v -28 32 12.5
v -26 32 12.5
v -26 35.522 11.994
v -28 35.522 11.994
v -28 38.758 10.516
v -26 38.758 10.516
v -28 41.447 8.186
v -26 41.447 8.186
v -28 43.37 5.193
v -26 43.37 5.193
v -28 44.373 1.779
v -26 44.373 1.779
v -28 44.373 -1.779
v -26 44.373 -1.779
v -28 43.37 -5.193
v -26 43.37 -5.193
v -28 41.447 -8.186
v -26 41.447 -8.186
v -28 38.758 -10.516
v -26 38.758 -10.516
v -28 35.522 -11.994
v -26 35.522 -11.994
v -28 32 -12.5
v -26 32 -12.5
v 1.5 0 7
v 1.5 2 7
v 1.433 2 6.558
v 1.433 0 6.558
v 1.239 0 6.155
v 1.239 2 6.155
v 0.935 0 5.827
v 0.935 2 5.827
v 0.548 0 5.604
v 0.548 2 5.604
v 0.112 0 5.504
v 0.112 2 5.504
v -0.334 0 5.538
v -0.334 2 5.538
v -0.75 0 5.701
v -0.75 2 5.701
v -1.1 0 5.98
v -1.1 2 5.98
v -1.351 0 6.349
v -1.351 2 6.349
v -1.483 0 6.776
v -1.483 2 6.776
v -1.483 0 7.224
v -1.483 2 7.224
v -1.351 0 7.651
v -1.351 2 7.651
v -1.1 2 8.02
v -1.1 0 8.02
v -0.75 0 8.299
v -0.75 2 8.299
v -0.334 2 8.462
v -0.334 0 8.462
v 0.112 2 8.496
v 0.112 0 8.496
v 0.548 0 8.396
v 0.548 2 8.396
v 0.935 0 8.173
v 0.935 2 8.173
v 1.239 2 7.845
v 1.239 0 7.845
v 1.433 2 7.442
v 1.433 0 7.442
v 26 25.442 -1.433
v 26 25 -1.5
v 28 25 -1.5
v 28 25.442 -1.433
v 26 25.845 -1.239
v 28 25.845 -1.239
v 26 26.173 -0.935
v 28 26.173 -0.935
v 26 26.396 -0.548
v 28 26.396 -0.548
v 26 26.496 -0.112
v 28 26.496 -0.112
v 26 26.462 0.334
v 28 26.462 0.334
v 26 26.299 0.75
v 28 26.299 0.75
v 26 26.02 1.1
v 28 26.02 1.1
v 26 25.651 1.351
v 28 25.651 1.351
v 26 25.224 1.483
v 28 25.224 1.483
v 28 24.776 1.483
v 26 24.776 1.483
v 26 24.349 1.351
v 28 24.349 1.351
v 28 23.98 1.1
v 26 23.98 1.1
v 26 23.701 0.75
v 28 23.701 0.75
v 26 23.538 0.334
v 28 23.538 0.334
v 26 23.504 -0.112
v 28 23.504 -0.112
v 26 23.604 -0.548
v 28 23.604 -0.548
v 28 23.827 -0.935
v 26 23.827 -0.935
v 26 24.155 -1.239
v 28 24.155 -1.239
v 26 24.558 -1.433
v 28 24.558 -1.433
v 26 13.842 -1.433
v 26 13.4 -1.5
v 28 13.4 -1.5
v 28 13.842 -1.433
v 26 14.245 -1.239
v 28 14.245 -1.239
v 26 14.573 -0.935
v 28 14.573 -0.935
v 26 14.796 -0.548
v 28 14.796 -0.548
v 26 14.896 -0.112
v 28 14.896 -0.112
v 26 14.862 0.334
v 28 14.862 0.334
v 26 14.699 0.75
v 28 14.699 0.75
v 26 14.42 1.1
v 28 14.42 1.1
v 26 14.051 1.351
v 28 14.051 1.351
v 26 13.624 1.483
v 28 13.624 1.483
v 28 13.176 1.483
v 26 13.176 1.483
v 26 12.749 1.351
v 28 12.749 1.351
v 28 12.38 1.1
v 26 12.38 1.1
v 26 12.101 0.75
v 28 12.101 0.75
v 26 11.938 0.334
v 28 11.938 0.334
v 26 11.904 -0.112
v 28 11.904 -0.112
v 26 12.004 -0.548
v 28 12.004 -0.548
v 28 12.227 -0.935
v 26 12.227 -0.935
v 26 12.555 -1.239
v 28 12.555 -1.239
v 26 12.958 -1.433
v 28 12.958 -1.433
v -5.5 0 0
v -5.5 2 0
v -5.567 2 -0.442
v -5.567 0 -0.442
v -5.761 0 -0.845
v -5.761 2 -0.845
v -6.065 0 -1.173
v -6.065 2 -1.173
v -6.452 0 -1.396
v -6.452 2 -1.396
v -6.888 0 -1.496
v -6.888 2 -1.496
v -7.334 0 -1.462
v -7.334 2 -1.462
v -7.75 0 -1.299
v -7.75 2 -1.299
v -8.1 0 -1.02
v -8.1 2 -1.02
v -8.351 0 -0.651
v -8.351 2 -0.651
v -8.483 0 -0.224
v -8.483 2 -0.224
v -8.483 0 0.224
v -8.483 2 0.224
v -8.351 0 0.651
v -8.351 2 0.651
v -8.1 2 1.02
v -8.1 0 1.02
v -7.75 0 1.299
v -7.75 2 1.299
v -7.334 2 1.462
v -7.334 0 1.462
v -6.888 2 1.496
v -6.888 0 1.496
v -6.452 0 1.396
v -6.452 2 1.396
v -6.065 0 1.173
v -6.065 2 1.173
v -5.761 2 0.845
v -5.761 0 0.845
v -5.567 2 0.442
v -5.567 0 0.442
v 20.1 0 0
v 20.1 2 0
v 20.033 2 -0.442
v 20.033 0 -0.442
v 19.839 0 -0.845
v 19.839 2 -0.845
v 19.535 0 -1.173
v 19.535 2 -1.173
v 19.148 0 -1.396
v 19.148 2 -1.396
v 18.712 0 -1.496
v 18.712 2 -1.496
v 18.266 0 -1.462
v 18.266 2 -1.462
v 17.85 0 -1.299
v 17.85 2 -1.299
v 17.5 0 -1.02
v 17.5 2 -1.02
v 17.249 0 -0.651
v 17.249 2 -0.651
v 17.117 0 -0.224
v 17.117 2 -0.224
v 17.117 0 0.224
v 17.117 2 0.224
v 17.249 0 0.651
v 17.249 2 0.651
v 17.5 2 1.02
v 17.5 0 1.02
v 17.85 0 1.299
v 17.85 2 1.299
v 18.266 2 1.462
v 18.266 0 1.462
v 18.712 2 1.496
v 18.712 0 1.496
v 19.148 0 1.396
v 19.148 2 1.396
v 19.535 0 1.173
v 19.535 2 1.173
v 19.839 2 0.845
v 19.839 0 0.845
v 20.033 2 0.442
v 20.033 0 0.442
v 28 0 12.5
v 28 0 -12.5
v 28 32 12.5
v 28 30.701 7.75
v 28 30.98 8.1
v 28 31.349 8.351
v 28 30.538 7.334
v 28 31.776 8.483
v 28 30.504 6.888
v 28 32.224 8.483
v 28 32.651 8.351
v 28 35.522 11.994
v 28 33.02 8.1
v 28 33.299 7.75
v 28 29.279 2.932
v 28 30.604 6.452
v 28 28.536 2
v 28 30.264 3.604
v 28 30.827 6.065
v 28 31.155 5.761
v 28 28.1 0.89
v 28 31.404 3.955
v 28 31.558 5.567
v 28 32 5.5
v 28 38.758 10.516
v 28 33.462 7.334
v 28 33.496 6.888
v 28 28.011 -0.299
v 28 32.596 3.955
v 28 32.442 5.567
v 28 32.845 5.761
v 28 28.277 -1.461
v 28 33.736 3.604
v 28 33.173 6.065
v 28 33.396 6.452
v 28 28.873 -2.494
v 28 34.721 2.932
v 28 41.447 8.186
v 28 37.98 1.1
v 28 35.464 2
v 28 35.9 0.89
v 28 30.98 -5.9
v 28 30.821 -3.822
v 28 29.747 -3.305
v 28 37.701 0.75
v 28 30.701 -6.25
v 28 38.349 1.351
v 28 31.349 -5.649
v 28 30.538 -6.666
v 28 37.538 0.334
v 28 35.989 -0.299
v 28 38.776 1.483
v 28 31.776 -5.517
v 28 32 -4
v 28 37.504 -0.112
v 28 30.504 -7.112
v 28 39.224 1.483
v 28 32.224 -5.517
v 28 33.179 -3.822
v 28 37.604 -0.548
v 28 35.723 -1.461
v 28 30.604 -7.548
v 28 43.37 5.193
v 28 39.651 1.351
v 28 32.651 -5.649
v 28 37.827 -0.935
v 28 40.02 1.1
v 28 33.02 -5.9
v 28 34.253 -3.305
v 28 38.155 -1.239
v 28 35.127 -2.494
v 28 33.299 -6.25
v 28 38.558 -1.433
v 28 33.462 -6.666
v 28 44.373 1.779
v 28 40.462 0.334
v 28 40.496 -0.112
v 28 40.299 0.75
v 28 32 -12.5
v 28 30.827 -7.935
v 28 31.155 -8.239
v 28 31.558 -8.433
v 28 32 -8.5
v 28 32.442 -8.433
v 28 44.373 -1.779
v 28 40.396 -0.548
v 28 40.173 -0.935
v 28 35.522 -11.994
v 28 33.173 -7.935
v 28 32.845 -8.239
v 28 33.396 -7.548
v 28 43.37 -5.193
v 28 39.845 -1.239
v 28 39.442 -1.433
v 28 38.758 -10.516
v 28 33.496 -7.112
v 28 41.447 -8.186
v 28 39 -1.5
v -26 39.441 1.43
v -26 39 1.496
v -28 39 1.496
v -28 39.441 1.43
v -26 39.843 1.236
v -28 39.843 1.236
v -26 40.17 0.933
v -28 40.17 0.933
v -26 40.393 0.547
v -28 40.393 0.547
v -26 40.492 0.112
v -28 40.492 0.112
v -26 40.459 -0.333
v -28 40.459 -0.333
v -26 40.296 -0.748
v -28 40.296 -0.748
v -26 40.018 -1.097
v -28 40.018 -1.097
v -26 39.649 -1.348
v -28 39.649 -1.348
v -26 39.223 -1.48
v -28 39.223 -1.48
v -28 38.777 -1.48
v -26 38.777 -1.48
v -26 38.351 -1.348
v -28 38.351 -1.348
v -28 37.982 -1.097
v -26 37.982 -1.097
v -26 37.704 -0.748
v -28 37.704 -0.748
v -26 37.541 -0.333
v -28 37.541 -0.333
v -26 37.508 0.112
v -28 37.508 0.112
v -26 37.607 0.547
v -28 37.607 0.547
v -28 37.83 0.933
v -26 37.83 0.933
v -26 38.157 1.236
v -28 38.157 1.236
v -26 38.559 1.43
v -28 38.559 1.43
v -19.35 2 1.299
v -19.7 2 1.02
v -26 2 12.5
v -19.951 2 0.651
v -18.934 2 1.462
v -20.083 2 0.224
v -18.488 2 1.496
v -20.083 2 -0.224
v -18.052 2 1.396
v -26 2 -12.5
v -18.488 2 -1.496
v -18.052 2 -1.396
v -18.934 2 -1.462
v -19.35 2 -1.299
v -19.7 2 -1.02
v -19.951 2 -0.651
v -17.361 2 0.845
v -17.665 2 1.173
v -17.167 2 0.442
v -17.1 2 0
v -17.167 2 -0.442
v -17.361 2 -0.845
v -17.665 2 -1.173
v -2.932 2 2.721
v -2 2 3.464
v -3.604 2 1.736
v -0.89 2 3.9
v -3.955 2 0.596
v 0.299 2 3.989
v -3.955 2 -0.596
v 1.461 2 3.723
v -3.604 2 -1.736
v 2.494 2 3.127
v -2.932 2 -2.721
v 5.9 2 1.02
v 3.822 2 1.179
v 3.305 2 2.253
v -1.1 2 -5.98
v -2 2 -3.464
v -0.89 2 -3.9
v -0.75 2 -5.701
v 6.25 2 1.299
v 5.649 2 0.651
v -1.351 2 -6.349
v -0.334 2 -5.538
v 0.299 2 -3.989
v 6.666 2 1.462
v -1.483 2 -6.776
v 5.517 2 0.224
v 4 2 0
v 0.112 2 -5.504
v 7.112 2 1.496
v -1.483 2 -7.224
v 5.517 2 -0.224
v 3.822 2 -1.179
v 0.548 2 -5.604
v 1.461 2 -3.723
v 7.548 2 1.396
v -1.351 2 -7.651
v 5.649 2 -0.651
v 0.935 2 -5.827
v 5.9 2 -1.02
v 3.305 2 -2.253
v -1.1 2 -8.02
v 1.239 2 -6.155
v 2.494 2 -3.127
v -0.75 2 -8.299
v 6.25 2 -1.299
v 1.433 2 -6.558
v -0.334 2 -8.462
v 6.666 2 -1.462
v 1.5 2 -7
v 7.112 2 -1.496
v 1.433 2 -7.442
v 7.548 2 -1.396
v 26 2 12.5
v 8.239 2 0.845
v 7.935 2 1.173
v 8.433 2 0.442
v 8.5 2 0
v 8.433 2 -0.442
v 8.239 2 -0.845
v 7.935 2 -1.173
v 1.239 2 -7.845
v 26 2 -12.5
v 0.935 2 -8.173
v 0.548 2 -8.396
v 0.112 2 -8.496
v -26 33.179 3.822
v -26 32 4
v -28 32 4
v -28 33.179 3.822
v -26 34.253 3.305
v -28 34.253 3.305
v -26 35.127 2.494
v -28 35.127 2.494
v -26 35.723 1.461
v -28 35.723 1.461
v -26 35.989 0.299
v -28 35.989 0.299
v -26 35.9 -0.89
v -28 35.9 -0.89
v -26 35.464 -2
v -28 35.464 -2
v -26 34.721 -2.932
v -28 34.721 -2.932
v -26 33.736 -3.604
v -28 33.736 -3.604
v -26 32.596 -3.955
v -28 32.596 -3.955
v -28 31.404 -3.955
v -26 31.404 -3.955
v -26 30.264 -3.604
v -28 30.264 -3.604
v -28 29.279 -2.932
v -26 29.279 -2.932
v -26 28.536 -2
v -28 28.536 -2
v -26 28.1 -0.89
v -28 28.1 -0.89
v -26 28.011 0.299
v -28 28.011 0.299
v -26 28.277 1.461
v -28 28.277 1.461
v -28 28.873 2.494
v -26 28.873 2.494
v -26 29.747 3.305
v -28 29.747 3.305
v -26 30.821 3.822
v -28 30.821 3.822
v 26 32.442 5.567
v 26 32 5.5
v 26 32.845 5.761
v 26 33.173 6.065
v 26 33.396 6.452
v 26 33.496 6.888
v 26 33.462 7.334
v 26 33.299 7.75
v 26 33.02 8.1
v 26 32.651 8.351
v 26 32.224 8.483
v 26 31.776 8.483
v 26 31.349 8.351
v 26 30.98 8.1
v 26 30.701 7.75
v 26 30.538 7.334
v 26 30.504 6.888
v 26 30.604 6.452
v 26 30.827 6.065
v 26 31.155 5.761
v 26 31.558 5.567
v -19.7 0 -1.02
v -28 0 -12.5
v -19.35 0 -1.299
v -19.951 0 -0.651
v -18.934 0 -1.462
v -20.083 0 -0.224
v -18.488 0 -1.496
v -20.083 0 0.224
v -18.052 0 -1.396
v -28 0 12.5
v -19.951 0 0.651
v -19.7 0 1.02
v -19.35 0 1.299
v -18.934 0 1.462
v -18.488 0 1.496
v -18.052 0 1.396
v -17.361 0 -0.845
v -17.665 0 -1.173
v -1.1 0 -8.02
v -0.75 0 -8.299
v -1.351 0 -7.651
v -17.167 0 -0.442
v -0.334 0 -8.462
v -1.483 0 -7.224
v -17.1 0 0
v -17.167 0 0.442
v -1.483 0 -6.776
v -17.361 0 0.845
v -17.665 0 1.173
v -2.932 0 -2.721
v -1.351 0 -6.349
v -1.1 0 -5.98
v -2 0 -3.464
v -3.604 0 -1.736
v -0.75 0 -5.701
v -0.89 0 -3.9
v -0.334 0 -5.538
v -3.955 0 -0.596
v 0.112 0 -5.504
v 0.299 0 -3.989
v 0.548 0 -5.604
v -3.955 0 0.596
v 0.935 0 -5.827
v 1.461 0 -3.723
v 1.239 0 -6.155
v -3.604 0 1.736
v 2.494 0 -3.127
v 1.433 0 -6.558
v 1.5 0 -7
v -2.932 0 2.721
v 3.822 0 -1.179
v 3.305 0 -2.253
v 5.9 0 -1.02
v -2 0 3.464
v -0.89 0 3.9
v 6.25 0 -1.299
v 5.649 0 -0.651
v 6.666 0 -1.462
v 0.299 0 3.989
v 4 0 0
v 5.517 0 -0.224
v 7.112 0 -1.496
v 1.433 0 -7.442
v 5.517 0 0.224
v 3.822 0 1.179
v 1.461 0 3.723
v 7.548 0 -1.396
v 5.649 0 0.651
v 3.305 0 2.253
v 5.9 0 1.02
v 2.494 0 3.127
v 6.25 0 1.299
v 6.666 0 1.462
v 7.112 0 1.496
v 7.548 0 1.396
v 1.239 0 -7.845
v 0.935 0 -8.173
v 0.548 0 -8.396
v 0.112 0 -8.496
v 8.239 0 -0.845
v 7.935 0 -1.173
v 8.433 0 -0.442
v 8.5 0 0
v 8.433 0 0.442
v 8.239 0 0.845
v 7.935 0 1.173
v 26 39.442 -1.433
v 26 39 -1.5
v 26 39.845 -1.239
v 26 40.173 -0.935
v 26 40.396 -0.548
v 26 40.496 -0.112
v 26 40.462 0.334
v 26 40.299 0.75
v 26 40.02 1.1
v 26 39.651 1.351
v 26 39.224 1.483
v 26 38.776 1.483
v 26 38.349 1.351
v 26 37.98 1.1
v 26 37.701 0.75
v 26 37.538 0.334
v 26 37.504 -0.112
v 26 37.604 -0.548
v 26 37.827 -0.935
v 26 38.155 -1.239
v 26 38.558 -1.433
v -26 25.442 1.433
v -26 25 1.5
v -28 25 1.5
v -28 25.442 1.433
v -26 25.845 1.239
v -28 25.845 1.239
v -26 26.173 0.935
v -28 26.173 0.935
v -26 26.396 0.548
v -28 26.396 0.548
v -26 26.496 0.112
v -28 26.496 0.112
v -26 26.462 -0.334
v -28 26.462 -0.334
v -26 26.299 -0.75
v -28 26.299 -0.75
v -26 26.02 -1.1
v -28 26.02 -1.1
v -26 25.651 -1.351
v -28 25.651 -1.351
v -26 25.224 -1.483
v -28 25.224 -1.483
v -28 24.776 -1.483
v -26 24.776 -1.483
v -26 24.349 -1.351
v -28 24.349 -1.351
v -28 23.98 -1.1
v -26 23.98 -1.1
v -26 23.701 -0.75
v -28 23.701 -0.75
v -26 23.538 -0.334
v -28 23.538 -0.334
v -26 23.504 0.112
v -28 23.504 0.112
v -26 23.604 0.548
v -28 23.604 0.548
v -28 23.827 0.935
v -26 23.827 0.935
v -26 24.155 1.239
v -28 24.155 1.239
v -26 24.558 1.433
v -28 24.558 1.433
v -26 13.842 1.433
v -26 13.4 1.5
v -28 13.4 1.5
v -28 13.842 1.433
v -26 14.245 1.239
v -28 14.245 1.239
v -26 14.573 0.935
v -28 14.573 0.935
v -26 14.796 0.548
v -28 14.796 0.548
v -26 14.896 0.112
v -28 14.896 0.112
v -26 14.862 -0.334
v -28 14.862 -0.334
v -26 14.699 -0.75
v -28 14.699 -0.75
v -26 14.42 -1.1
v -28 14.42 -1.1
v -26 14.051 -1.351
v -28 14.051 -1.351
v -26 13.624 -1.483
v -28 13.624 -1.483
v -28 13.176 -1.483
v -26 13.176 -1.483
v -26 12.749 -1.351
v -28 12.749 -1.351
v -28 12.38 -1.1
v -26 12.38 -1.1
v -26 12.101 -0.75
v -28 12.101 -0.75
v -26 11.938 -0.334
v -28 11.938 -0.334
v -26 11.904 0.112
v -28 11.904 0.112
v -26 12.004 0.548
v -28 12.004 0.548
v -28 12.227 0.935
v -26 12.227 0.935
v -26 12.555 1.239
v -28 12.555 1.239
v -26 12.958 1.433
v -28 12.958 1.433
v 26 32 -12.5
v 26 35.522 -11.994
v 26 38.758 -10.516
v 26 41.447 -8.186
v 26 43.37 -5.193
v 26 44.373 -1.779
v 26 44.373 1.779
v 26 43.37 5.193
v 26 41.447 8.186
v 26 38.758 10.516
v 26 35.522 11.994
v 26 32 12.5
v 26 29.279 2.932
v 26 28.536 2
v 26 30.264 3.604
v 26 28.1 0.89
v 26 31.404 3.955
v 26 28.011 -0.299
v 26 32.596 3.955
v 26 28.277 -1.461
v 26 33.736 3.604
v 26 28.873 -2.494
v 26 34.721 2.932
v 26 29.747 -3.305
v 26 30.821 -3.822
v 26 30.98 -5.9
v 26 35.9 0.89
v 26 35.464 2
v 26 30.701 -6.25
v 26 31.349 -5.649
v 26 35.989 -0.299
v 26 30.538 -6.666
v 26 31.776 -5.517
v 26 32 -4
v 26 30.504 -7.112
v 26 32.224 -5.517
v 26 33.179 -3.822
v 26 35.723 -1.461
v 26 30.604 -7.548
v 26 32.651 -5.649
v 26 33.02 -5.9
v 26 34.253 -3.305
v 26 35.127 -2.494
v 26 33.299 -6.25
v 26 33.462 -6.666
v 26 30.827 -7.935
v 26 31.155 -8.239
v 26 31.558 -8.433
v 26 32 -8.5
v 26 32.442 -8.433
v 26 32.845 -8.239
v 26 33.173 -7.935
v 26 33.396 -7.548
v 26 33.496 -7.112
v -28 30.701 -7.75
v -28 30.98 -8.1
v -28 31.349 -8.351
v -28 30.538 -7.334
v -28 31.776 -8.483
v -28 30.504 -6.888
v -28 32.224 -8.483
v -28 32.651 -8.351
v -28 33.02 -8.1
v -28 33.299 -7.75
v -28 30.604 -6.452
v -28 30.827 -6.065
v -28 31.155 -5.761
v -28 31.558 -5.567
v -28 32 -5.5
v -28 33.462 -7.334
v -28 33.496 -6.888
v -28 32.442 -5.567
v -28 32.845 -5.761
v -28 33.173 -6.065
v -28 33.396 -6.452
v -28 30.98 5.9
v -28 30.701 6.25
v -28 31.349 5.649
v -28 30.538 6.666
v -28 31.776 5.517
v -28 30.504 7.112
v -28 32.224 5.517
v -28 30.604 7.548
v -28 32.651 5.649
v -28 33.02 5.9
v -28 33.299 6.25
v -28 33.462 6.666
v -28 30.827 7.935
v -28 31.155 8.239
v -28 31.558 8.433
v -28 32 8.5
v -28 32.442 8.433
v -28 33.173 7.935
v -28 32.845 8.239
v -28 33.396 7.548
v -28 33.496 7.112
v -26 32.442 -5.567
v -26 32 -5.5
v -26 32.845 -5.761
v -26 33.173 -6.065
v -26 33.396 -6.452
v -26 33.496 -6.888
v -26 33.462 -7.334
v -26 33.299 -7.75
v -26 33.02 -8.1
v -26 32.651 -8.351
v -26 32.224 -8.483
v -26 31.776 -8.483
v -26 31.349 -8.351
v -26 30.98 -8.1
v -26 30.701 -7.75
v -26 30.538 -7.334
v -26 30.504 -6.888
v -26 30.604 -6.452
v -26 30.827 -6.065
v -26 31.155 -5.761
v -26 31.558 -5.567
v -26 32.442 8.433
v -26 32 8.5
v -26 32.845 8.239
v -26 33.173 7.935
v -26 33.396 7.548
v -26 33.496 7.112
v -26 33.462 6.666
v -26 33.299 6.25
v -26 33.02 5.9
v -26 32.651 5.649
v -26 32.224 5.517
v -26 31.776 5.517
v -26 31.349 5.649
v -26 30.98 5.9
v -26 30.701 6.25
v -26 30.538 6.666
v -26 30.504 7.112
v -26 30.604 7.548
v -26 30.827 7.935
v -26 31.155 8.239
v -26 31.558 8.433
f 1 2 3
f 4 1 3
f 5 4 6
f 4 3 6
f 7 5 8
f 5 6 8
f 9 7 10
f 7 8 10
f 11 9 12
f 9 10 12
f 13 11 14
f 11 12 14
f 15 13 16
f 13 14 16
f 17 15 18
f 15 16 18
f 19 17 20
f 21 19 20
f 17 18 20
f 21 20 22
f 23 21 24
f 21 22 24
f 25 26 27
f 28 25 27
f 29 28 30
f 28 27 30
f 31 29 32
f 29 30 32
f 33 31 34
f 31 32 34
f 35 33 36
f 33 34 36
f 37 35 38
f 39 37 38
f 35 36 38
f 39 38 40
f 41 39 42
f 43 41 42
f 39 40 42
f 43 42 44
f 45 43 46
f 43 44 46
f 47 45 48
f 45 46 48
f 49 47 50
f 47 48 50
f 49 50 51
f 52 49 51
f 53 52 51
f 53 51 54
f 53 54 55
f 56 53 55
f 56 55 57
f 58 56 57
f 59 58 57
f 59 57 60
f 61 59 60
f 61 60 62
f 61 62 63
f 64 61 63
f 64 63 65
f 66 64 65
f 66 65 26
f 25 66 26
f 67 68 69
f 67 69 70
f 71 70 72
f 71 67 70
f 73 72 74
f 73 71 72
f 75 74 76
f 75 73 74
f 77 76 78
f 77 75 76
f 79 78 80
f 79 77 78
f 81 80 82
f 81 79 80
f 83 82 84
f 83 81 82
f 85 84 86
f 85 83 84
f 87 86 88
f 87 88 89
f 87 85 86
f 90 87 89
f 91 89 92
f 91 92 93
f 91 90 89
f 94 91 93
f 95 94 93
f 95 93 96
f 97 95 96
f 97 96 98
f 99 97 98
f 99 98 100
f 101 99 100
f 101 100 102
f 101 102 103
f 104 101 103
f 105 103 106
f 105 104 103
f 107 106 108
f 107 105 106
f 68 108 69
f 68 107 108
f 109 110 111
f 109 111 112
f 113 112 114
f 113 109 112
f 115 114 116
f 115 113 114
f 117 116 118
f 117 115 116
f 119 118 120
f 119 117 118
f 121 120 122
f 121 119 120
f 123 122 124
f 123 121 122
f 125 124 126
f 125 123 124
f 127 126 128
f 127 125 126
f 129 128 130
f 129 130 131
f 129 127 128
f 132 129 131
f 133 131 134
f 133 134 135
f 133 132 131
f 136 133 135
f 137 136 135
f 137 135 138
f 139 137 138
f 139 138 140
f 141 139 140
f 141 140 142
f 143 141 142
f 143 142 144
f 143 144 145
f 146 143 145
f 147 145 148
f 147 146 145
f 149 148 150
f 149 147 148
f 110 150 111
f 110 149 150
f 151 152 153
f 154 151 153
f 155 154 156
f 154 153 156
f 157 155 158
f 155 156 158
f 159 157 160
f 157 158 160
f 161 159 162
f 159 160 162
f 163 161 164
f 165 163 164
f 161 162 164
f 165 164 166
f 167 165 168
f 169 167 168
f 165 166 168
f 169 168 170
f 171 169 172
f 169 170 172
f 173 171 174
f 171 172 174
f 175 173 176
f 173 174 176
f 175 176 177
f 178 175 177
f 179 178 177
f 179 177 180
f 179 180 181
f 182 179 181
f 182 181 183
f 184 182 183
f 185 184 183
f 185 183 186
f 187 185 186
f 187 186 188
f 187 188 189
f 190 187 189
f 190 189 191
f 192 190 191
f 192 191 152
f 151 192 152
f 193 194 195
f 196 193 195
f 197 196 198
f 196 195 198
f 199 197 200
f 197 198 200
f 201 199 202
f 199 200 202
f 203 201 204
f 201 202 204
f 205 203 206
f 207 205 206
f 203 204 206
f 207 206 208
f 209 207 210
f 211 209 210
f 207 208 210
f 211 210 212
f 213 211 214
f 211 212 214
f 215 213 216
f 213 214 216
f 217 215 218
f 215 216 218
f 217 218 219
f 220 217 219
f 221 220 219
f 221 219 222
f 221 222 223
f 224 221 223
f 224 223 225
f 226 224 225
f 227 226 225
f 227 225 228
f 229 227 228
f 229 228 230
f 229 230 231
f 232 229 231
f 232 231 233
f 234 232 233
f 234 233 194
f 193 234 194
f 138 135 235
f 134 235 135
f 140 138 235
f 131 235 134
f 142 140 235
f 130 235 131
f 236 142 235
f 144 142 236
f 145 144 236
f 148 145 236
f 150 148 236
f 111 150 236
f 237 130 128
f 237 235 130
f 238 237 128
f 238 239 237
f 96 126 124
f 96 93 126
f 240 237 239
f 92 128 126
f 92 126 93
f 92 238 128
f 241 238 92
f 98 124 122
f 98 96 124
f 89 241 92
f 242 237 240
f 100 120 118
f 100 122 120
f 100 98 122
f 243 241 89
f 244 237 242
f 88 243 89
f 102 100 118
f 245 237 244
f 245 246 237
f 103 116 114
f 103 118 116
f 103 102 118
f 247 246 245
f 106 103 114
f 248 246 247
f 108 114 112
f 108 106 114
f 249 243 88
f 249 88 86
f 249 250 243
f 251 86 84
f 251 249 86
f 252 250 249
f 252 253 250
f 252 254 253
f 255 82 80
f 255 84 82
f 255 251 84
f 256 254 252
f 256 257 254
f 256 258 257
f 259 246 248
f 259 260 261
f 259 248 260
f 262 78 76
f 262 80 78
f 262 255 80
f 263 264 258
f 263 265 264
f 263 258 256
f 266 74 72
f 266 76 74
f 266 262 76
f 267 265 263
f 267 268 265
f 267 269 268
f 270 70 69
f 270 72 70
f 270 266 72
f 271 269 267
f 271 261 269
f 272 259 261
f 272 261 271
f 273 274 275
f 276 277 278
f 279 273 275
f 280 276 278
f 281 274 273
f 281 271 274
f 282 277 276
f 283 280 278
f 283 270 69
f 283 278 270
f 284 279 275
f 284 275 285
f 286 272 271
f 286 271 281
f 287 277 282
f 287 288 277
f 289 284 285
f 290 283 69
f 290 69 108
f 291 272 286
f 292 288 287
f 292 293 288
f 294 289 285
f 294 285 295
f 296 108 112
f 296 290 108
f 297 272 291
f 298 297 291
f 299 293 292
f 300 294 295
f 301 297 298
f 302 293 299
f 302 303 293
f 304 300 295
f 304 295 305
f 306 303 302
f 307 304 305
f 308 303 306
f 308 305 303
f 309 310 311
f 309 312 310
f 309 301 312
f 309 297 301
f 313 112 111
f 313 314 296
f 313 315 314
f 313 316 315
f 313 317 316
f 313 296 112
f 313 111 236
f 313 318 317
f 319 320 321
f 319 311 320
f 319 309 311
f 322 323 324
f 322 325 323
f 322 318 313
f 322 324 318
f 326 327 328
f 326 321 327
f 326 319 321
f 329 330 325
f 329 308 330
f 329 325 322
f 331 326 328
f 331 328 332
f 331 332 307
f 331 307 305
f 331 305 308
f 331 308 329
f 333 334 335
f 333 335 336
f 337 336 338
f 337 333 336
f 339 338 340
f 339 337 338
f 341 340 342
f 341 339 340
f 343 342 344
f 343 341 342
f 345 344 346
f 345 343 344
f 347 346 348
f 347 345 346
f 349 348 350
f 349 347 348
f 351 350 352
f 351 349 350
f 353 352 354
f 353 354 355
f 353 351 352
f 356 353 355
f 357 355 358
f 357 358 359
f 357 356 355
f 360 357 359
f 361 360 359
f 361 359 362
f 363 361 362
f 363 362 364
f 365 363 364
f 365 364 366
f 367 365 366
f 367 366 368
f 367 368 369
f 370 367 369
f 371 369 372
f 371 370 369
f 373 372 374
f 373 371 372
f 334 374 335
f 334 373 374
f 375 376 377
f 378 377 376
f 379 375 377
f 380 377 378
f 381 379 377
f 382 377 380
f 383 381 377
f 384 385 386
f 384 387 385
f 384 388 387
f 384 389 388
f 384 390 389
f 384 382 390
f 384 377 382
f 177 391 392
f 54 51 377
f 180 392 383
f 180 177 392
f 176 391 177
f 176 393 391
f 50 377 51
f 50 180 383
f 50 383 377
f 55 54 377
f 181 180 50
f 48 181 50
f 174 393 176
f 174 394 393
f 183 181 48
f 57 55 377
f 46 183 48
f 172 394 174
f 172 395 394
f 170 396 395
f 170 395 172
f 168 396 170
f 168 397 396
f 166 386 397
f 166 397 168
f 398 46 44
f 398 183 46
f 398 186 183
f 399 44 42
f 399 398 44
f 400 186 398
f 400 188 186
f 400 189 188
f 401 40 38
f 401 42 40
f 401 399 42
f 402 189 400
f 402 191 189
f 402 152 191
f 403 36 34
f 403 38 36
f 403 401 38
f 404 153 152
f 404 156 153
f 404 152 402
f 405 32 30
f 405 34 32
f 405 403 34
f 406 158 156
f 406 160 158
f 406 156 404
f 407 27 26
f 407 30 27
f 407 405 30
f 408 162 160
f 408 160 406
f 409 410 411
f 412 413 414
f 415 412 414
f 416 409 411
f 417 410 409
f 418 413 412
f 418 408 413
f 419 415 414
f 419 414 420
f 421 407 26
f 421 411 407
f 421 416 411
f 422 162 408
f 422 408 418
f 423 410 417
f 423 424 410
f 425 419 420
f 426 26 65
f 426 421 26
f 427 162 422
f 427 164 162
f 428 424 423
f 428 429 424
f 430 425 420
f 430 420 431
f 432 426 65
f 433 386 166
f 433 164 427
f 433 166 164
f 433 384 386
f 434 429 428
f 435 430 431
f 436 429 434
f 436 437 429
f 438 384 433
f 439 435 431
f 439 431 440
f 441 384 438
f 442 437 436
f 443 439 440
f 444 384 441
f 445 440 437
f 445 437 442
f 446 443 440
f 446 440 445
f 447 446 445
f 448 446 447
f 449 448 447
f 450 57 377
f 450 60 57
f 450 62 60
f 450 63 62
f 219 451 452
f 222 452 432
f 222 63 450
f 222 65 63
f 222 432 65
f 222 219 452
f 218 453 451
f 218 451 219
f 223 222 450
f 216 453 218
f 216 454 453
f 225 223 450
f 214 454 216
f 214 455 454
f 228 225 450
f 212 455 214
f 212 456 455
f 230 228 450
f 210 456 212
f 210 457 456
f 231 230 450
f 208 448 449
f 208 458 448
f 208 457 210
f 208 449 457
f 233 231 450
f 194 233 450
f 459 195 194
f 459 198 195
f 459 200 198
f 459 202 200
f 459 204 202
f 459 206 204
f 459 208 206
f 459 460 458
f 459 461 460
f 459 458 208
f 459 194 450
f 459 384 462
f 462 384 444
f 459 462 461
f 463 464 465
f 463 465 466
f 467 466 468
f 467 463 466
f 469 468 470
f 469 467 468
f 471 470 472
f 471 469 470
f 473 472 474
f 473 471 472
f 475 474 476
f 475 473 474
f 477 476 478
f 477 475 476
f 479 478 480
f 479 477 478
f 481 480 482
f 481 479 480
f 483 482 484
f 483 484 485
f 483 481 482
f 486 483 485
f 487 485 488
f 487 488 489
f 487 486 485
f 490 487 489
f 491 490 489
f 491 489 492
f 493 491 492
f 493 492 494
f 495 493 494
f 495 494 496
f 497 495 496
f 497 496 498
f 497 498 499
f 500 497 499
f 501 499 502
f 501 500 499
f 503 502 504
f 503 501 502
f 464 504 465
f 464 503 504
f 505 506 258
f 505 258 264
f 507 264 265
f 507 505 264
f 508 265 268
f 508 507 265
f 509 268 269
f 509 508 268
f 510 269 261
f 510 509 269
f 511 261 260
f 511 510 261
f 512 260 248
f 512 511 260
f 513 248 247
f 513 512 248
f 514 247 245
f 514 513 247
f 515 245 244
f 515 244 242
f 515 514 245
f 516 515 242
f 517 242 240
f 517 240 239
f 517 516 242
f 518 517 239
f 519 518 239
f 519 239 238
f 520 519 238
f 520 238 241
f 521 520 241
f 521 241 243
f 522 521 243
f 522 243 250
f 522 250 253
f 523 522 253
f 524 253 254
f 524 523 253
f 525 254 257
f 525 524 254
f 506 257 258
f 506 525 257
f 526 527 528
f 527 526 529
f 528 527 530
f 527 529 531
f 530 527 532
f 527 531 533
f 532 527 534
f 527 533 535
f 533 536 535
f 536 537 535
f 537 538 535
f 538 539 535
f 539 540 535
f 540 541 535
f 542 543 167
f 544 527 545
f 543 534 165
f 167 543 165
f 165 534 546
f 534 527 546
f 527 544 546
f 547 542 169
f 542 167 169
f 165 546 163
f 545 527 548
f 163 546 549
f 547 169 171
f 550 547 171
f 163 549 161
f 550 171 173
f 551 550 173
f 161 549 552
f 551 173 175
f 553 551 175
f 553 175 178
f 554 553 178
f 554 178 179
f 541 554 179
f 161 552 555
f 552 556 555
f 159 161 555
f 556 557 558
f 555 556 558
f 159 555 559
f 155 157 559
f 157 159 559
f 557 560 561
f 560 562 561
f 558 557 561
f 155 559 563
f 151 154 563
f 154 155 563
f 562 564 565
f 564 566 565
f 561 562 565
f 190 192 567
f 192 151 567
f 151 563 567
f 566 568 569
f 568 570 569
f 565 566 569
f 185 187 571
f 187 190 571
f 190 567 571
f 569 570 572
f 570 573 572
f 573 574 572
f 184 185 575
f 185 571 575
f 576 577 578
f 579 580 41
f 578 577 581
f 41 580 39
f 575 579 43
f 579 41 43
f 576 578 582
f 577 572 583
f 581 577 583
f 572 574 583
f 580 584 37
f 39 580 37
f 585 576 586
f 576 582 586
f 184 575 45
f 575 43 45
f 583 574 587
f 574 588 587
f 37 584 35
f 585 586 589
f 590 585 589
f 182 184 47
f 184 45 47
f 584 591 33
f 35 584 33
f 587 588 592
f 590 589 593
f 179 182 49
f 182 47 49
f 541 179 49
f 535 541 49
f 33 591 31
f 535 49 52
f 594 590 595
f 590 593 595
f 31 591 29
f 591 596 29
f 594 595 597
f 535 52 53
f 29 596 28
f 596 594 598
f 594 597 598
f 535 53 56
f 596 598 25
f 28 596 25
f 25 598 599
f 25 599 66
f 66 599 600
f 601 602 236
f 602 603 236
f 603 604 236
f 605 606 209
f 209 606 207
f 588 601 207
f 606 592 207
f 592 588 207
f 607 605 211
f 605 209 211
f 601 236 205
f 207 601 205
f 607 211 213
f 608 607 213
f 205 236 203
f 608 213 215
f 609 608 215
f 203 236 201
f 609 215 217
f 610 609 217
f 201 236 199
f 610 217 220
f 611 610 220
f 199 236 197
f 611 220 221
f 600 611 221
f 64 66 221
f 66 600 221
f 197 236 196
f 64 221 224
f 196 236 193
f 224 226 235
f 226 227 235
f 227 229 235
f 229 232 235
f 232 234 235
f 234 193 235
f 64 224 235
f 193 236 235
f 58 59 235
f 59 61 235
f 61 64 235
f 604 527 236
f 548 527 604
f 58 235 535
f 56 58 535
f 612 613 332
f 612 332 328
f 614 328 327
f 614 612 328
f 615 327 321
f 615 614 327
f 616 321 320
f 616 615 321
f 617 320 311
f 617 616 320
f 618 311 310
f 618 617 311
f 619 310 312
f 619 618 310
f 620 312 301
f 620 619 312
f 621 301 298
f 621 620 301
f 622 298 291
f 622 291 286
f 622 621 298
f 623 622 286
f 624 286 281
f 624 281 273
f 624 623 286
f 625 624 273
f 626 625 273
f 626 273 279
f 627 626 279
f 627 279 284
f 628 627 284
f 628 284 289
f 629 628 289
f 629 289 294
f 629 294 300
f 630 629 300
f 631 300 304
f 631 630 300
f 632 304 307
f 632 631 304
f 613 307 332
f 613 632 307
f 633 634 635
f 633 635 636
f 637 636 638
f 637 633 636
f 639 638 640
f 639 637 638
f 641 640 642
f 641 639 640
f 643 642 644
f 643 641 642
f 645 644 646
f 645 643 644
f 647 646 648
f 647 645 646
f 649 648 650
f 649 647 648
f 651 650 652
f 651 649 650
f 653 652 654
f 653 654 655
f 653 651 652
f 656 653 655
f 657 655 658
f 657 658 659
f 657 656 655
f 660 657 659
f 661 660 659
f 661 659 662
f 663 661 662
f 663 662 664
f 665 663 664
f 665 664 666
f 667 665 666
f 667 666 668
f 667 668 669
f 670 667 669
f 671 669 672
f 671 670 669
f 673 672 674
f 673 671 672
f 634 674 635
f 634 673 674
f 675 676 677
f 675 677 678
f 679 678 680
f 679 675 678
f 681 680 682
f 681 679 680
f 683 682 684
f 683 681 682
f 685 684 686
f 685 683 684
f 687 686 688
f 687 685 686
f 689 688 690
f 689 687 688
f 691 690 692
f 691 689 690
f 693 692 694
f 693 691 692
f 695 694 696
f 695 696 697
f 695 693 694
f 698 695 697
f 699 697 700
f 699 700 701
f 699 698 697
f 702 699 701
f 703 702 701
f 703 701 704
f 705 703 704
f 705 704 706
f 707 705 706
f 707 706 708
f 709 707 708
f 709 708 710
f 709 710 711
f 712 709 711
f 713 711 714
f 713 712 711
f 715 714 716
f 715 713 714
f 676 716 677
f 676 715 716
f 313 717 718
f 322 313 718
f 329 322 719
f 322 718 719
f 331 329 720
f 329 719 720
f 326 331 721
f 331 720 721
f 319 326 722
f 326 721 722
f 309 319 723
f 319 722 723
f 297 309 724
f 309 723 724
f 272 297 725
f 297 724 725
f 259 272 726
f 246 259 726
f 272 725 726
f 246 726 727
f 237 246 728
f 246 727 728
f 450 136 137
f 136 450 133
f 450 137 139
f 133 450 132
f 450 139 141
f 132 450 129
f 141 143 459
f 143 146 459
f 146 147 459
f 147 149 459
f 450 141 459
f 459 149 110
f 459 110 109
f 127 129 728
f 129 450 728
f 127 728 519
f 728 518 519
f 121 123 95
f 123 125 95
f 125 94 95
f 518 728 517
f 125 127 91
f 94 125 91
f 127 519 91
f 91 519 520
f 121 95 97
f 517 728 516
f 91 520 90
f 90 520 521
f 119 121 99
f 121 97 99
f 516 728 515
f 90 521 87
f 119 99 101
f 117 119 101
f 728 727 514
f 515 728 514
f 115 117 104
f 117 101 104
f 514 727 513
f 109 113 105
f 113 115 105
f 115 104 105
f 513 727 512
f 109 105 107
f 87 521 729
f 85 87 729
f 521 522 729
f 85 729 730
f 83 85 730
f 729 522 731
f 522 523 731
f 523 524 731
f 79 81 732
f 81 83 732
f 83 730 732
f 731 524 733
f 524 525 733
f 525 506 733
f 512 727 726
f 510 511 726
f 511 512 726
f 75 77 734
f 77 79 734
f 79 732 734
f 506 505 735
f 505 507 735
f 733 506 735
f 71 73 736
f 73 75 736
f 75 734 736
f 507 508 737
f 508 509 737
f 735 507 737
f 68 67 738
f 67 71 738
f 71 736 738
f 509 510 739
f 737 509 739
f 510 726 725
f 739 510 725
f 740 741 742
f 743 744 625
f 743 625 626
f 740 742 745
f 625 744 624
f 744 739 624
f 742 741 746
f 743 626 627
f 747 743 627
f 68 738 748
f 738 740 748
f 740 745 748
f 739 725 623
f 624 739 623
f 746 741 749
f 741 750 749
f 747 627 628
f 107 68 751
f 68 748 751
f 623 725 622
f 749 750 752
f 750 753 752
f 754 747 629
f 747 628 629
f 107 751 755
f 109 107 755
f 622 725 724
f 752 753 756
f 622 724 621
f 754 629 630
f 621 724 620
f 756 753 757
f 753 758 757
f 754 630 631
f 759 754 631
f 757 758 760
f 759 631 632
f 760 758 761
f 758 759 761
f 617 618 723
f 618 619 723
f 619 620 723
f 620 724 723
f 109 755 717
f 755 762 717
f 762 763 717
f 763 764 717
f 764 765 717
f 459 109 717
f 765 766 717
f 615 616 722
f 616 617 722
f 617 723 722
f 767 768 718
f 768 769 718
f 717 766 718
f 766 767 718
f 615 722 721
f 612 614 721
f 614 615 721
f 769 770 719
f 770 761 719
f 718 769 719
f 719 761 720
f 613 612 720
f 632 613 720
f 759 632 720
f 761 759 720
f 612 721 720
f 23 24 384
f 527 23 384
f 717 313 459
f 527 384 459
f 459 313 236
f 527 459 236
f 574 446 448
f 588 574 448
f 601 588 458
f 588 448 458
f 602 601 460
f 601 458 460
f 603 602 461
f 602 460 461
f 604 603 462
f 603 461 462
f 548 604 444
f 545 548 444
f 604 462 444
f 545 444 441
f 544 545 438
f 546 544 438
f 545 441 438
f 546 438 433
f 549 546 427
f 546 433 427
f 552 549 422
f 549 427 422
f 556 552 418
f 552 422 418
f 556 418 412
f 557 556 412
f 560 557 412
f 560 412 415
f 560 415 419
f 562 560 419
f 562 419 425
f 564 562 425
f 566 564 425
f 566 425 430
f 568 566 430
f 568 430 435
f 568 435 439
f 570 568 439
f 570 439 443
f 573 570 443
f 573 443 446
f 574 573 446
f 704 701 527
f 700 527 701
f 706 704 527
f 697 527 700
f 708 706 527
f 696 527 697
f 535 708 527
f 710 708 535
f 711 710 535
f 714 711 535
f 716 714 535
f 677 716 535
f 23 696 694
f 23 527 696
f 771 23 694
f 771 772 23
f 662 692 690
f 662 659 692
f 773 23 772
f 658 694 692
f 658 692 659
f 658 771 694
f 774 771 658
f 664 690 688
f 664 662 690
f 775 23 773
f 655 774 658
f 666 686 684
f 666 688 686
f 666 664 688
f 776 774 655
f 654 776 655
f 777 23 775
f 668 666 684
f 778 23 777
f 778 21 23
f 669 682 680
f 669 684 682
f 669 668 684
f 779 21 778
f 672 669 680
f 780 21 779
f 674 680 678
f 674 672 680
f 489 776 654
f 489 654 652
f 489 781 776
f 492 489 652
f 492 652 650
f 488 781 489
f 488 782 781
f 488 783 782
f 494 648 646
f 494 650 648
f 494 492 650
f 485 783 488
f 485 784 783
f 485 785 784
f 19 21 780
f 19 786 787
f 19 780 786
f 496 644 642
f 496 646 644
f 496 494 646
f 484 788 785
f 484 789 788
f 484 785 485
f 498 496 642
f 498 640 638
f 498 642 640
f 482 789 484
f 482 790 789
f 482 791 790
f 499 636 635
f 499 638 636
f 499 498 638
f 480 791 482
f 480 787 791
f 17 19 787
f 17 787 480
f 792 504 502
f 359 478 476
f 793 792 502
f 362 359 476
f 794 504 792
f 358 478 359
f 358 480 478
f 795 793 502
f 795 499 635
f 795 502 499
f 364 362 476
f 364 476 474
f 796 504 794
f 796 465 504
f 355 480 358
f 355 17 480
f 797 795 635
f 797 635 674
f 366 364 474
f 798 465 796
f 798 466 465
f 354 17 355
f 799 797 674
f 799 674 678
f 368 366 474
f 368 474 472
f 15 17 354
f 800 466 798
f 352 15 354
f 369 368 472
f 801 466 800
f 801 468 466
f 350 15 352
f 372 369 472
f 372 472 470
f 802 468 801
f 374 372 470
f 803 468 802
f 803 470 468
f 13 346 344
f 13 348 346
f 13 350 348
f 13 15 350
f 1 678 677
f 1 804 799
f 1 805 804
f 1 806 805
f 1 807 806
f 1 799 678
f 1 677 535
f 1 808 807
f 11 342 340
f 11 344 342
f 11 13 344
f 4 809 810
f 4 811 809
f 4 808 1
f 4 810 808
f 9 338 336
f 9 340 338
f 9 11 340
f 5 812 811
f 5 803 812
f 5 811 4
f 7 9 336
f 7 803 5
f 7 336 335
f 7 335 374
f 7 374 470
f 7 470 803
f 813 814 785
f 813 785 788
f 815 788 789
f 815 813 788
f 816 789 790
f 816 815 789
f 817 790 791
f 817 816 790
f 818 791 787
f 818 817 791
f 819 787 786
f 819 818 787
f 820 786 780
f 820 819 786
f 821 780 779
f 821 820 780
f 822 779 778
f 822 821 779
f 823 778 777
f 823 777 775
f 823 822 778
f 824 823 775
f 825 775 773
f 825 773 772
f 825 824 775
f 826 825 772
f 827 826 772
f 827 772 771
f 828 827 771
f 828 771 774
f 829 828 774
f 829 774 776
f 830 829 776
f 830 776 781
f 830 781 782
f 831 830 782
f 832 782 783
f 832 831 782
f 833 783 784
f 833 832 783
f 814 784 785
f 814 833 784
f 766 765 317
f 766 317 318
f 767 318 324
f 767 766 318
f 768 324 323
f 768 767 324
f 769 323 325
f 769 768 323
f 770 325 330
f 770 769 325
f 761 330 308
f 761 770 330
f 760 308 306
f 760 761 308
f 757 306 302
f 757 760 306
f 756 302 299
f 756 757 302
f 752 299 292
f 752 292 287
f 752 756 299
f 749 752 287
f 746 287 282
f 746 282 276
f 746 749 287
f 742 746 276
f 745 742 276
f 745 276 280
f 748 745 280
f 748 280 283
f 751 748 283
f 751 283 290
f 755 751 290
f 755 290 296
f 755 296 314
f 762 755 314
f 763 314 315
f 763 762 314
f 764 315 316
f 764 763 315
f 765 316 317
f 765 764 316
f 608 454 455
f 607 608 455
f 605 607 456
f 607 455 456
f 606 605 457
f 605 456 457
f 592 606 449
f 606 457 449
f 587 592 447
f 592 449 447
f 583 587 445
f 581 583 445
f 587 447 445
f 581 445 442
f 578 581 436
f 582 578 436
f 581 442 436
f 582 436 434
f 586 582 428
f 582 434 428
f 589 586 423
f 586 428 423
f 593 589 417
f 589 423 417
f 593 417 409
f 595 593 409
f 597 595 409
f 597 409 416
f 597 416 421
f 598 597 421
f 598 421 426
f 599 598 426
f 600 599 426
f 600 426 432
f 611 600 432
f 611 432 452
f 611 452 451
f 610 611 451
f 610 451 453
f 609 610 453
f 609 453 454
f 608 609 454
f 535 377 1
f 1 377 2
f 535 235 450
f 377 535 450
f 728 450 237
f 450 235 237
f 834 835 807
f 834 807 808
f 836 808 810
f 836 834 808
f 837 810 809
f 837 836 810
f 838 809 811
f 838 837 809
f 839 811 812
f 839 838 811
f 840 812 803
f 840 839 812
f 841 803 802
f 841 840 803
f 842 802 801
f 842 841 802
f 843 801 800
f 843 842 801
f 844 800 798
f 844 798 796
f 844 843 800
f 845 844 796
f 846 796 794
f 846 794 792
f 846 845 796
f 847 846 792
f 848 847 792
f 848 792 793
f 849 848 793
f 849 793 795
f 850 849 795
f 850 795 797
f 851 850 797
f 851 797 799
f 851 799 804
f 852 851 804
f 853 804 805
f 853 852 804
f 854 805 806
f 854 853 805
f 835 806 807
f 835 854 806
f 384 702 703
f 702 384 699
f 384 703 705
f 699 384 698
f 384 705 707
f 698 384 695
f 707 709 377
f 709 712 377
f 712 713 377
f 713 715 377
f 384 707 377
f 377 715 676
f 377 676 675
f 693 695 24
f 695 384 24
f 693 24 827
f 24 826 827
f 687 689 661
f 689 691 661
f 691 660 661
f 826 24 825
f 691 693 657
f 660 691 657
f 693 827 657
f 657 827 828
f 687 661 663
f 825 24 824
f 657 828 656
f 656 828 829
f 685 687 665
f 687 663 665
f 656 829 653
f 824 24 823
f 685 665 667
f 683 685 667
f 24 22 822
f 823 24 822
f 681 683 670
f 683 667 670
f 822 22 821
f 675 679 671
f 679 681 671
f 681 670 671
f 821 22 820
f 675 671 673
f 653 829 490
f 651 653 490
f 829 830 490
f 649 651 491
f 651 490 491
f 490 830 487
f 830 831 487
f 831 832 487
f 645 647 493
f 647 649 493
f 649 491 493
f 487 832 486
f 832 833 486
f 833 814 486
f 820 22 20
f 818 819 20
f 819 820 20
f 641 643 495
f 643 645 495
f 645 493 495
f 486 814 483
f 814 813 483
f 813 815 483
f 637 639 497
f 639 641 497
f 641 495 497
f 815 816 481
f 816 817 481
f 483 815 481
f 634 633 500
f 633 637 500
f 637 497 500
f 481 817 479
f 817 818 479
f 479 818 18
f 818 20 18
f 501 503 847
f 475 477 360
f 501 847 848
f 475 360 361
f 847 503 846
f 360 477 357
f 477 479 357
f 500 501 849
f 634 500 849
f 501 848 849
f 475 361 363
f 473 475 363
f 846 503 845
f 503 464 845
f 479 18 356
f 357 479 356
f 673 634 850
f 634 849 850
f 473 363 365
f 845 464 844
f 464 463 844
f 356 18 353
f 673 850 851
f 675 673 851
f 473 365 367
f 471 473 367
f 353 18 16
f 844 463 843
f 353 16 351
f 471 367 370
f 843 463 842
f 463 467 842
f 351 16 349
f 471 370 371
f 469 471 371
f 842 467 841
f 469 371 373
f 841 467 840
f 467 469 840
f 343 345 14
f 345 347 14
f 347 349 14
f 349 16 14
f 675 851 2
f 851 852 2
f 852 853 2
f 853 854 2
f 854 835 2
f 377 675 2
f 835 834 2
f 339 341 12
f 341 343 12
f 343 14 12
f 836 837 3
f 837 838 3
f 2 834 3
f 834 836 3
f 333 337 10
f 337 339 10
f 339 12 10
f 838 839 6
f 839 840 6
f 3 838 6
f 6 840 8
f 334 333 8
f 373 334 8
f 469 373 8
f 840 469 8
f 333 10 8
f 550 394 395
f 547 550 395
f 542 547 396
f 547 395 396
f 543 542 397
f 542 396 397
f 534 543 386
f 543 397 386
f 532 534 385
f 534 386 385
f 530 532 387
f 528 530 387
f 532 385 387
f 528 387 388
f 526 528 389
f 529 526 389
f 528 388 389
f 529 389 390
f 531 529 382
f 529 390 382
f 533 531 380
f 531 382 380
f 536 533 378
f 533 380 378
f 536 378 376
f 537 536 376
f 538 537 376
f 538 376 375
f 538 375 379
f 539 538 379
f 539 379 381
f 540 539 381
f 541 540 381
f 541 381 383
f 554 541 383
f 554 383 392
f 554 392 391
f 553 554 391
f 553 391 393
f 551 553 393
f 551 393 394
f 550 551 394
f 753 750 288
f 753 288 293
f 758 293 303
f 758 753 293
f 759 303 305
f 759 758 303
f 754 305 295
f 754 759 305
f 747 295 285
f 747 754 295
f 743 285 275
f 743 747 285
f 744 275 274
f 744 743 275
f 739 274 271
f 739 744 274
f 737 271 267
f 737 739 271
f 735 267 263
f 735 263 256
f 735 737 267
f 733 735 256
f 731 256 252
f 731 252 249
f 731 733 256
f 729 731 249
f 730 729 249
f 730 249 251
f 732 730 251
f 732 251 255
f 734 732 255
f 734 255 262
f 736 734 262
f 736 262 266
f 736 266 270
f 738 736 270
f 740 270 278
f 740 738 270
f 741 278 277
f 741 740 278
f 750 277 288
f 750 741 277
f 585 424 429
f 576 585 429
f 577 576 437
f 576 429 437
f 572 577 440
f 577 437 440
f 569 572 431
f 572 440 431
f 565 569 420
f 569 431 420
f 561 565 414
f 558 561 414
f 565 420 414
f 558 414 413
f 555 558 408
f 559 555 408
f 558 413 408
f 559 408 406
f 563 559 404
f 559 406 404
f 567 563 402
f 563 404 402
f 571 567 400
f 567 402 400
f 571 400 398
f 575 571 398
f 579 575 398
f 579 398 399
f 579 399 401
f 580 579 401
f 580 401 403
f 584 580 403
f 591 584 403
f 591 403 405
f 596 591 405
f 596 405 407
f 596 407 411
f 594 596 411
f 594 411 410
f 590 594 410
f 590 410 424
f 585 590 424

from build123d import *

# Parameters (mm, degrees)
SKETCH1_W           = 52
SKETCH1_H           = 25
BOSS_EXTRUDE1_DEPTH = 2
SKETCH3_R           = 4
SKETCH3_R_2         = 1.5
CUT_EXTRUDE1_DEPTH  = 3
SKETCH4_R           = 4
SKETCH4_R_2         = 1.5
BOSS_EXTRUDE3_DEPTH = 2
SKETCH5_R           = 4
SKETCH5_R_2         = 1.496339982
SKETCH5_R_3         = 1.5
BOSS_EXTRUDE4_DEPTH = 2


with BuildPart() as part:
    # Sketch1 → Boss-Extrude1 (new body)
    with BuildSketch(Plane(origin=(0, 0, 0), x_dir=(1, 0, 0), z_dir=(0, 1, 0))):
        Rectangle(SKETCH1_W, SKETCH1_H)
    extrude(amount=BOSS_EXTRUDE1_DEPTH)

    # Sketch3 → Cut-Extrude1 (cut, through all)
    with BuildSketch(Plane(origin=(0, 2, 0), x_dir=(1, 0, 0), z_dir=(0, 1, 0))):
        Circle(SKETCH3_R)
        with Locations((18.6, 0)):
            Circle(SKETCH3_R_2)
        with Locations((7, 0)):
            Circle(SKETCH3_R_2)
        with Locations((0, 7)):
            Circle(SKETCH3_R_2)
        with Locations((-7, 0)):
            Circle(SKETCH3_R_2)
        with Locations((0, -7)):
            Circle(SKETCH3_R_2)
        with Locations((-18.6, 0)):
            Circle(SKETCH3_R_2)
    extrude(amount=-CUT_EXTRUDE1_DEPTH, mode=Mode.SUBTRACT)

    # Sketch4 → Boss-Extrude3 (add)
    with BuildSketch(Plane(origin=(26, 0, 0), x_dir=(0, 0, -1), z_dir=(1, 0, 0))):
        with BuildLine():
            Line((-12.5, 0), (12.5, 0))
            Line((12.5, 0), (12.5, 32))
            ThreePointArc((12.5, 32), (0, 44.5), (-12.5, 32))
            Line((-12.5, 32), (-12.5, 0))
        make_face()
        with Locations((0, 32)):
            Circle(SKETCH4_R, mode=Mode.SUBTRACT)
        with Locations((0, 39)):
            Circle(SKETCH4_R_2, mode=Mode.SUBTRACT)
        with Locations((7, 32)):
            Circle(SKETCH4_R_2, mode=Mode.SUBTRACT)
        with Locations((0, 25)):
            Circle(SKETCH4_R_2, mode=Mode.SUBTRACT)
        with Locations((-7, 32)):
            Circle(SKETCH4_R_2, mode=Mode.SUBTRACT)
        with Locations((0, 13.4)):
            Circle(SKETCH4_R_2, mode=Mode.SUBTRACT)
    extrude(amount=BOSS_EXTRUDE3_DEPTH)

    # Sketch5 → Boss-Extrude4 (add)
    with BuildSketch(Plane.ZY.offset(26)):
        with BuildLine():
            Line((-12.5, 0), (12.5, 0))
            Line((12.5, 0), (12.5, 32))
            ThreePointArc((12.5, 32), (0, 44.5), (-12.5, 32))
            Line((-12.5, 32), (-12.5, 0))
        make_face()
        with Locations((0, 32)):
            Circle(SKETCH5_R, mode=Mode.SUBTRACT)
        with Locations((0, 39)):
            Circle(SKETCH5_R_2, mode=Mode.SUBTRACT)
        with Locations((7, 32)):
            Circle(SKETCH5_R_3, mode=Mode.SUBTRACT)
        with Locations((0, 25)):
            Circle(SKETCH5_R_3, mode=Mode.SUBTRACT)
        with Locations((-7, 32)):
            Circle(SKETCH5_R_3, mode=Mode.SUBTRACT)
        with Locations((0, 13.4)):
            Circle(SKETCH5_R_3, mode=Mode.SUBTRACT)
    extrude(amount=BOSS_EXTRUDE4_DEPTH)


solid = part.part
